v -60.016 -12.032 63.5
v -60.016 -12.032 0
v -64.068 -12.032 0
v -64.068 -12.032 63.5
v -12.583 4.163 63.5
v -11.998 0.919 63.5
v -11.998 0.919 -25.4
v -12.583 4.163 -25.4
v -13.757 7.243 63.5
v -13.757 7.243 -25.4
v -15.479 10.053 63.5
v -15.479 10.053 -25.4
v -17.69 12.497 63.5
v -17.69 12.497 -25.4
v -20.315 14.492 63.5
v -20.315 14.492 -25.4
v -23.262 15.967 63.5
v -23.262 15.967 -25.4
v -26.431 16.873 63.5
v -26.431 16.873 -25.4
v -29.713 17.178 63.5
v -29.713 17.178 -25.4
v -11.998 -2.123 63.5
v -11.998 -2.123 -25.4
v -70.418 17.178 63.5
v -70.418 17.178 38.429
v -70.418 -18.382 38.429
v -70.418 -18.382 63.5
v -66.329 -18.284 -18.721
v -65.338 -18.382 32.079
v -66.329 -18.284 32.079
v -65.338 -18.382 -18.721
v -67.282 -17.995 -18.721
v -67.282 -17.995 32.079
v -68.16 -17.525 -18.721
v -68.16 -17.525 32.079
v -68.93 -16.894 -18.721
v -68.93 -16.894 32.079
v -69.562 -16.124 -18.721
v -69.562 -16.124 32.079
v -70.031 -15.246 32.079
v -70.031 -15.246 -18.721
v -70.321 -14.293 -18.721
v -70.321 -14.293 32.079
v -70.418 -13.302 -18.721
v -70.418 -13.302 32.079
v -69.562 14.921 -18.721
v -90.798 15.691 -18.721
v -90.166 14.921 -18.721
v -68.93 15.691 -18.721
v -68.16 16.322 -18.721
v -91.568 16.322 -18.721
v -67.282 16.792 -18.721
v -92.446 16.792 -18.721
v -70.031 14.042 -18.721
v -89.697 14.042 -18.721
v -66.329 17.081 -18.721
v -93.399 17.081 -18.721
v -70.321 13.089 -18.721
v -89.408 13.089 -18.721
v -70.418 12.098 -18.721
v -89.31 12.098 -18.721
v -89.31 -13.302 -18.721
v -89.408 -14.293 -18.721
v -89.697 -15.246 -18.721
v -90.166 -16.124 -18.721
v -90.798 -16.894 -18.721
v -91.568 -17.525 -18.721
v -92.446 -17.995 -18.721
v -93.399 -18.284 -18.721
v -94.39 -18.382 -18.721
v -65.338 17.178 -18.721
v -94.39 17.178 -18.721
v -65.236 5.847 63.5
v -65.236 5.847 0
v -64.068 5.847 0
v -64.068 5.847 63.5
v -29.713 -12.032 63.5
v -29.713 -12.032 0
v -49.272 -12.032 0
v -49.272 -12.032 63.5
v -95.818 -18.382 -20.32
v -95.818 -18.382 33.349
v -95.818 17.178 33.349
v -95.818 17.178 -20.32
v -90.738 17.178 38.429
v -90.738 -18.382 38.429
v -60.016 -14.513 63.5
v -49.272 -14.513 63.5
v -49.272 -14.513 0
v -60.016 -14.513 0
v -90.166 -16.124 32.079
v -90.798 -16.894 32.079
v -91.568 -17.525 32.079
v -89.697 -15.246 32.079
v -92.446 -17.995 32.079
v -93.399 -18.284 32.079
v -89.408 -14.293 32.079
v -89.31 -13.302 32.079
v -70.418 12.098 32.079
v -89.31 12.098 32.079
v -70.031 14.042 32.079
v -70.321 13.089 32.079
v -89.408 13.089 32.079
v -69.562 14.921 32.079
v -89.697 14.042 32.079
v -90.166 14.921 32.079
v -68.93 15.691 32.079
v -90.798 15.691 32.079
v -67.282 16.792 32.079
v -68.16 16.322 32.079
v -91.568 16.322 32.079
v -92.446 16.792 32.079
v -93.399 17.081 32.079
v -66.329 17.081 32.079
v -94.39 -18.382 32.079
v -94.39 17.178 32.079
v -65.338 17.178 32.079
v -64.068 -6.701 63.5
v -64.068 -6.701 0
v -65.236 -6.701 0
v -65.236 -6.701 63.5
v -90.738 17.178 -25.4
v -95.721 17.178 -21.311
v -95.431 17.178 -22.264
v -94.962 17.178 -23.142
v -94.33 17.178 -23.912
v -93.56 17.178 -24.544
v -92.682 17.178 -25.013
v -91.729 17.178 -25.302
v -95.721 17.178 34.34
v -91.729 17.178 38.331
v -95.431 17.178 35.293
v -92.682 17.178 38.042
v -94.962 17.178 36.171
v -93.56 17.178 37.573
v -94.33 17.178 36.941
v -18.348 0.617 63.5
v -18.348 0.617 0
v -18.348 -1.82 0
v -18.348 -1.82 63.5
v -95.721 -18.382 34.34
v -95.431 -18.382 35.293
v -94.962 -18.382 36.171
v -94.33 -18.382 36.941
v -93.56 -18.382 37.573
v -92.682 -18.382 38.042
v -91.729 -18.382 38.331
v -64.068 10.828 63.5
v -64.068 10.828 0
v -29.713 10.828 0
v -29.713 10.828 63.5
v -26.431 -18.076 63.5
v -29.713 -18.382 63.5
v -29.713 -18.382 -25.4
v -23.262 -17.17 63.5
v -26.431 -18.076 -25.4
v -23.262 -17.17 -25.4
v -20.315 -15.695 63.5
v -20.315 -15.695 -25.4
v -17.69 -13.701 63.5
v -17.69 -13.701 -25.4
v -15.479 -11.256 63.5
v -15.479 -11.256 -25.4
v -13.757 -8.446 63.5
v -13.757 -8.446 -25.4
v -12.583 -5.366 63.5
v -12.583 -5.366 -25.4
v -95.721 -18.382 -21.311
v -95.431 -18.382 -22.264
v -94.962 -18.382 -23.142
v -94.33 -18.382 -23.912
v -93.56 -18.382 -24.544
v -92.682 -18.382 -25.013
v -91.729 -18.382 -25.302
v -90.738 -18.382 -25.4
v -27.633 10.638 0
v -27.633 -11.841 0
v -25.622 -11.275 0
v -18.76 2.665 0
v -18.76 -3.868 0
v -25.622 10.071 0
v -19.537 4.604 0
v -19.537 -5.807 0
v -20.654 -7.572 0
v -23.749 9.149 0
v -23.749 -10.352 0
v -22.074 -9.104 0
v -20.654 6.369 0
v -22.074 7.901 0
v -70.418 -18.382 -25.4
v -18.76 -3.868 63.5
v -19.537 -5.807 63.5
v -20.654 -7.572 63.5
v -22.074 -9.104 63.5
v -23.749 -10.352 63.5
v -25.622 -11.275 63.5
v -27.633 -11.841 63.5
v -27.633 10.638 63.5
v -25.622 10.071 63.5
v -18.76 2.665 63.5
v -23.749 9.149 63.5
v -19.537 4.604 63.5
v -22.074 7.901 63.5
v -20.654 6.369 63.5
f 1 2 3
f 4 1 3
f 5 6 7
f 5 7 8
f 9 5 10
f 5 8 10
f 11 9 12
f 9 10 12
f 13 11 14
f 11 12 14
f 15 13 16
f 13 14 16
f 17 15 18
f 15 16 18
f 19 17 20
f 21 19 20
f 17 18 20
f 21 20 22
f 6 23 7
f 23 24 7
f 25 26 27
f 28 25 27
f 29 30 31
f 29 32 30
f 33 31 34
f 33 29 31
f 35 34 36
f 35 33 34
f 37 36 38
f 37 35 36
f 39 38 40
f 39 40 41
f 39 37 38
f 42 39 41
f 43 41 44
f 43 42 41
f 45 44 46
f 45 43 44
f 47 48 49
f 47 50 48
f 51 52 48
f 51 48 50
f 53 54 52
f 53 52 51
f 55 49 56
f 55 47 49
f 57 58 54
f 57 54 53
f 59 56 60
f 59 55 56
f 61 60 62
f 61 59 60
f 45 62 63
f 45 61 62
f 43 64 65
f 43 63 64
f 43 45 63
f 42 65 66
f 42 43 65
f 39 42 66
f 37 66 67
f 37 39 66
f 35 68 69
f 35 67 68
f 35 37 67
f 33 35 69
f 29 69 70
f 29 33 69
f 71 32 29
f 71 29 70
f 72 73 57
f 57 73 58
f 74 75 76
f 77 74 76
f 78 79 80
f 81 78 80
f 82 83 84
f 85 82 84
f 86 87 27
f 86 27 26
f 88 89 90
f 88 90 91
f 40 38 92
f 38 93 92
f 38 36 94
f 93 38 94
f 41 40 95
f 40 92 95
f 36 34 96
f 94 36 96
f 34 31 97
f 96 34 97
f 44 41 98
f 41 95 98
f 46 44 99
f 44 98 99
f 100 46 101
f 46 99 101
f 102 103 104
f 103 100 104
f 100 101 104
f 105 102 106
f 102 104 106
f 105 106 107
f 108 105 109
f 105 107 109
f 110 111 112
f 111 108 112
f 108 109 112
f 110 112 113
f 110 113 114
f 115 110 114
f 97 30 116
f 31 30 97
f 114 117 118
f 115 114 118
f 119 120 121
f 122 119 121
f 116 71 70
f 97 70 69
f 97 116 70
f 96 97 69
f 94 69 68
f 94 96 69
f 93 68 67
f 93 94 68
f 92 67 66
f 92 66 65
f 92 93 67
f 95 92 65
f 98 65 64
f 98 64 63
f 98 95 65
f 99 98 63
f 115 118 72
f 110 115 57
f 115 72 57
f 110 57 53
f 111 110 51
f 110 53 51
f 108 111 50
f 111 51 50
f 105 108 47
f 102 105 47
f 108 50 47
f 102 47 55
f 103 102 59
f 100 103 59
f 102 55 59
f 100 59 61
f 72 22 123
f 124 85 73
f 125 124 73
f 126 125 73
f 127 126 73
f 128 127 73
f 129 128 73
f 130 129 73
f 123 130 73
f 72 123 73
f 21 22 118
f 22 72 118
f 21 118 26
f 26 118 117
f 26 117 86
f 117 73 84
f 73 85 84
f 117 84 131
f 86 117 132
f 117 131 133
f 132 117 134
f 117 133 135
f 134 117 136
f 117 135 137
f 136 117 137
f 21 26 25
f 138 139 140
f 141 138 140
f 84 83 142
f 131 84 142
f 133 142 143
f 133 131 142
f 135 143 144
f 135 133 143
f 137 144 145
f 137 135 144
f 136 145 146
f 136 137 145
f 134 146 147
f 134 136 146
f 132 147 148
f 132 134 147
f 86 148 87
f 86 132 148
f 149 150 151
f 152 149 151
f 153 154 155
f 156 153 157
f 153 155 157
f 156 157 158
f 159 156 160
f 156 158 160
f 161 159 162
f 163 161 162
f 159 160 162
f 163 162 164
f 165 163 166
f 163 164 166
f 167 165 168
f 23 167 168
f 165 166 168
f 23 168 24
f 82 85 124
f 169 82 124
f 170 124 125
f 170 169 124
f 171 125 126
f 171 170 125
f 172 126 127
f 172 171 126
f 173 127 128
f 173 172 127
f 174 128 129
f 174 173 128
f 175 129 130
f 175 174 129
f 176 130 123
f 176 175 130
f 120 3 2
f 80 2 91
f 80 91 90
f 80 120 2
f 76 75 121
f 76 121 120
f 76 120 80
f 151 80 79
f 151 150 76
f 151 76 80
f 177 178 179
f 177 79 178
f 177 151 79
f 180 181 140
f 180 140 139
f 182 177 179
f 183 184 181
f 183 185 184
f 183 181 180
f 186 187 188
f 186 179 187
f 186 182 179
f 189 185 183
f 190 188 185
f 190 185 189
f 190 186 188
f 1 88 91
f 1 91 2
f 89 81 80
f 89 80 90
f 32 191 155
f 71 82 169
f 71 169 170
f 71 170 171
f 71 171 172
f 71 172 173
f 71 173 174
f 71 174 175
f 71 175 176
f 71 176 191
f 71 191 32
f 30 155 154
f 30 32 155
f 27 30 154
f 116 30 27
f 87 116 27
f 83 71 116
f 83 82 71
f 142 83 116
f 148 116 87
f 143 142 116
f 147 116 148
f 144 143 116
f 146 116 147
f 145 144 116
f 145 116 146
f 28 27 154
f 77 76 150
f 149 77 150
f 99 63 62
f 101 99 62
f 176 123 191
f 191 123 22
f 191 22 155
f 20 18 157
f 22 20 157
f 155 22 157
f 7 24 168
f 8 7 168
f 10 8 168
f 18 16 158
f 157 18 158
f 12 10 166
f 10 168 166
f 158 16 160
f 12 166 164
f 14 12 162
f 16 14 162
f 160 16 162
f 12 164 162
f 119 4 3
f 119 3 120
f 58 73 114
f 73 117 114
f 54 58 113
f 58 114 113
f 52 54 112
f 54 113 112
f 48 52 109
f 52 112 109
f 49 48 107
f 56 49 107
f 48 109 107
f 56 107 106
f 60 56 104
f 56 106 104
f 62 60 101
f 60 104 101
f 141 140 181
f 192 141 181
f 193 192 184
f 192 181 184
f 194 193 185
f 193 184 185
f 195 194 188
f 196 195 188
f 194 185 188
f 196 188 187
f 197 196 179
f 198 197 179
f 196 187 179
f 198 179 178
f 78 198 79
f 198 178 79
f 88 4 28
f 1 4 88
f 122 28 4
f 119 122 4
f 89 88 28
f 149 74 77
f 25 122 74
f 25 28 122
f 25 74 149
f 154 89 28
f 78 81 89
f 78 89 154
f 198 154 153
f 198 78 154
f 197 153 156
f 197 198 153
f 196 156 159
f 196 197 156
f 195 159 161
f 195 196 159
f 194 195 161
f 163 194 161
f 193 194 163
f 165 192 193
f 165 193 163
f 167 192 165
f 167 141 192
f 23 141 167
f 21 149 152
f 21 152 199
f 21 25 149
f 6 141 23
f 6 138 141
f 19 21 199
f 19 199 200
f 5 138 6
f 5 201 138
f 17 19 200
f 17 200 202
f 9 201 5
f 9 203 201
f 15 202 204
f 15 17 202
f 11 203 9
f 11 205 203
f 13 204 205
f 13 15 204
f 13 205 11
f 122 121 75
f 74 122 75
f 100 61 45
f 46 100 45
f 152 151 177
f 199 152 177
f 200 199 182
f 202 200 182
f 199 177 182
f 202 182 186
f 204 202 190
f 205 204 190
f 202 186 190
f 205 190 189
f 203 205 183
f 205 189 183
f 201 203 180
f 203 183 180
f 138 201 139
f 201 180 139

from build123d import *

# Parameters (mm, degrees)
F2_DEPTH  = 6.35
F3_DEPTH  = 25.4
F5_DEPTH  = 63.5
F6_W      = 35.5600007778
F6_H      = 6.6786579132
F7_DEPTH  = 25.4
F8_W      = 6.5081897405
F8_H      = 35.5600007778
F9_DEPTH  = 57.15
F10_W     = 35.5600007778
F10_H     = 6.35
F11_DEPTH = 19.05
F12_R     = 5.08
F13_R     = 5.08
F14_R     = 5.08
F15_R     = 5.08
F16_R     = 5.08


# Not quite as in the source:
# - two fillets or chamfers of one size are made in one step


with BuildPart() as f2:
    # F0 (on Top) → F2 (new body)
    with BuildSketch(Plane.XY):
        with BuildLine():
            ThreePointArc((-18.3481574059, -1.8204556262), (-18.2829820174, -0.6015784588), (-18.3481574059, 0.6172987085))
            Line((-18.3481574059, 0.6172987085), (-18.3481574059, -1.8204556262))
        make_face()
        with BuildLine():
            Line((-29.7129820174, 10.8284215412), (-64.0681574059, 10.8284215412))
            Line((-64.0681574059, 10.8284215412), (-64.0681574059, 5.8474093676))
            Line((-64.0681574059, 5.8474093676), (-65.235733552, 5.8474093676))
            Line((-65.235733552, 5.8474093676), (-65.235733552, -6.7013129592))
            Line((-65.235733552, -6.7013129592), (-64.0681574059, -6.7013129592))
            Line((-64.0681574059, -6.7013129592), (-64.0681574059, -12.0315784588))
            Line((-64.0681574059, -12.0315784588), (-60.0158534944, -12.0315784588))
            Line((-60.0158534944, -12.0315784588), (-60.0158534944, -14.5130921155))
            Line((-60.0158534944, -14.5130921155), (-49.2716534944, -14.5130921155))
            Line((-49.2716534944, -14.5130921155), (-49.2716534944, -12.0315784588))
            Line((-49.2716534944, -12.0315784588), (-29.7129820174, -12.0315784588))
            ThreePointArc((-29.7129820174, -12.0315784588), (-22.0738350108, -9.1038330429), (-18.3481574059, -1.8204556262))
            Line((-18.3481574059, -1.8204556262), (-18.3481574059, 0.6172987085))
            ThreePointArc((-18.3481574059, 0.6172987085), (-22.0738350108, 7.9006761252), (-29.7129820174, 10.8284215412))
        make_face()
    extrude(amount=-F2_DEPTH)

    # F1 (on Top) → F3 (join)
    with BuildSketch(Plane.XY):
        with BuildLine():
            Line((-42.9216531055, -18.3815788478), (-29.7129820174, -18.3815788478))
            ThreePointArc((-29.7129820174, -18.3815788478), (-17.6903920931, -13.7006526758), (-11.9981570169, -2.1225613757))
            Line((-11.9981570169, -2.1225613757), (-11.9981570169, 0.919404458))
            ThreePointArc((-11.9981570169, 0.919404458), (-17.6903920931, 12.4974957581), (-29.7129820174, 17.1784219301))
            Line((-29.7129820174, 17.1784219301), (-70.4181577948, 17.1784219301))
            Line((-70.4181577948, 17.1784219301), (-70.4181577948, 12.1974097565))
            Line((-70.4181577948, 12.1974097565), (-70.4181577948, -13.0513133481))
            Line((-70.4181577948, -13.0513133481), (-70.4181577948, -18.3815788478))
            Line((-70.4181577948, -18.3815788478), (-66.3658538833, -18.3815788478))
            Line((-66.3658538833, -18.3815788478), (-42.9216531055, -18.3815788478))
        make_face()
    extrude(amount=-F3_DEPTH)

    # F4 (on face) → F5 (join)
    with BuildSketch(Plane.XY):
        with BuildLine():
            Line((-42.9216538833, -18.3815788478), (-29.7129820174, -18.3815788478))
            ThreePointArc((-29.7129820174, -18.3815788478), (-17.6903920931, -13.7006526758), (-11.9981570169, -2.1225613757))
            Line((-11.9981570169, -2.1225613757), (-11.9981570169, 0.919404458))
            ThreePointArc((-11.9981570169, 0.919404458), (-17.6903920931, 12.4974957581), (-29.7129820174, 17.1784219301))
            Line((-29.7129820174, 17.1784219301), (-70.4181577948, 17.1784219301))
            Line((-70.4181577948, 17.1784219301), (-70.4181577948, 12.1974097565))
            Line((-70.4181577948, 12.1974097565), (-70.4181577948, -13.0513133481))
            Line((-70.4181577948, -13.0513133481), (-70.4181577948, -18.3815788478))
            Line((-70.4181577948, -18.3815788478), (-66.3658538833, -18.3815788478))
            Line((-66.3658538833, -18.3815788478), (-42.9216538833, -18.3815788478))
        make_face()
        with BuildLine():
            Line((-65.2357339409, 5.8474097565), (-64.0681577948, 5.8474097565))
            Line((-64.0681577948, 5.8474097565), (-64.0681577948, 10.8284219301))
            Line((-64.0681577948, 10.8284219301), (-29.7129820174, 10.8284219301))
            ThreePointArc((-29.7129820174, 10.8284219301), (-22.0738347431, 7.9006764075), (-18.3481570169, 0.6172987293))
            Line((-18.3481570169, 0.6172987293), (-18.3481570169, -1.820455647))
            ThreePointArc((-18.3481570169, -1.820455647), (-22.0738347431, -9.1038333252), (-29.7129820174, -12.0315788478))
            Line((-29.7129820174, -12.0315788478), (-49.2716531055, -12.0315788478))
            Line((-49.2716531055, -12.0315788478), (-49.2716531055, -14.5130925044))
            Line((-49.2716531055, -14.5130925044), (-60.0158538833, -14.5130925044))
            Line((-60.0158538833, -14.5130925044), (-60.0158538833, -12.0315788478))
            Line((-60.0158538833, -12.0315788478), (-64.0681577948, -12.0315788478))
            Line((-64.0681577948, -12.0315788478), (-64.0681577948, -6.7013133481))
            Line((-64.0681577948, -6.7013133481), (-65.2357339409, -6.7013133481))
            Line((-65.2357339409, -6.7013133481), (-65.2357339409, 5.8474097565))
        make_face(mode=Mode.SUBTRACT)
    extrude(amount=F5_DEPTH)

    # F6 (on face) → F7 (join)
    with BuildSketch(Plane(origin=(-70.4181577948, 0, 0), x_dir=(0, -1, 0), z_dir=(-1, 0, 0))):
        with Locations((0.6015784588, -22.0606710434)):
            Rectangle(F6_W, F6_H)
    extrude(amount=F7_DEPTH)

    # F8 (on face) → F9 (join)
    with BuildSketch(Plane.XY.offset(-18.7213420868)):
        with Locations((-92.5640629245, -0.6015784588)):
            Rectangle(F8_W, F8_H)
    extrude(amount=F9_DEPTH)

    # F10 (on face) → F11 (join)
    with BuildSketch(Plane.YZ.offset(-89.3099680543)):
        with Locations((-0.6015784588, 35.2536579132)):
            Rectangle(F10_W, F10_H)
    extrude(amount=F11_DEPTH)

    # F12
    f12_edges = [f2.edges().sort_by_distance(p)[0] for p in [
        (-95.818158, -0.601578, 38.428658),
    ]]
    fillet(f12_edges, radius=F12_R)

    # F13
    f13_edges = [f2.edges().sort_by_distance(p)[0] for p in [
        (-95.818158, -0.601578, -25.4),
    ]]
    fillet(f13_edges, radius=F13_R)

    # F14
    f14_edges = [f2.edges().sort_by_distance(p)[0] for p in [
        (-70.418158, -18.381579, 6.678658),
    ]]
    fillet(f14_edges, radius=F14_R)

    # F15
    f15_edges = [f2.edges().sort_by_distance(p)[0] for p in [
        (-70.418158, 17.178422, 6.678658),
    ]]
    fillet(f15_edges, radius=F15_R)

    # F16
    f16_edges = [f2.edges().sort_by_distance(p)[0] for p in [
        (-89.309968, 17.178422, 6.678658),
        (-89.309968, -18.381579, 6.678658),
    ]]
    fillet(f16_edges, radius=F16_R)


solid = f2.part
